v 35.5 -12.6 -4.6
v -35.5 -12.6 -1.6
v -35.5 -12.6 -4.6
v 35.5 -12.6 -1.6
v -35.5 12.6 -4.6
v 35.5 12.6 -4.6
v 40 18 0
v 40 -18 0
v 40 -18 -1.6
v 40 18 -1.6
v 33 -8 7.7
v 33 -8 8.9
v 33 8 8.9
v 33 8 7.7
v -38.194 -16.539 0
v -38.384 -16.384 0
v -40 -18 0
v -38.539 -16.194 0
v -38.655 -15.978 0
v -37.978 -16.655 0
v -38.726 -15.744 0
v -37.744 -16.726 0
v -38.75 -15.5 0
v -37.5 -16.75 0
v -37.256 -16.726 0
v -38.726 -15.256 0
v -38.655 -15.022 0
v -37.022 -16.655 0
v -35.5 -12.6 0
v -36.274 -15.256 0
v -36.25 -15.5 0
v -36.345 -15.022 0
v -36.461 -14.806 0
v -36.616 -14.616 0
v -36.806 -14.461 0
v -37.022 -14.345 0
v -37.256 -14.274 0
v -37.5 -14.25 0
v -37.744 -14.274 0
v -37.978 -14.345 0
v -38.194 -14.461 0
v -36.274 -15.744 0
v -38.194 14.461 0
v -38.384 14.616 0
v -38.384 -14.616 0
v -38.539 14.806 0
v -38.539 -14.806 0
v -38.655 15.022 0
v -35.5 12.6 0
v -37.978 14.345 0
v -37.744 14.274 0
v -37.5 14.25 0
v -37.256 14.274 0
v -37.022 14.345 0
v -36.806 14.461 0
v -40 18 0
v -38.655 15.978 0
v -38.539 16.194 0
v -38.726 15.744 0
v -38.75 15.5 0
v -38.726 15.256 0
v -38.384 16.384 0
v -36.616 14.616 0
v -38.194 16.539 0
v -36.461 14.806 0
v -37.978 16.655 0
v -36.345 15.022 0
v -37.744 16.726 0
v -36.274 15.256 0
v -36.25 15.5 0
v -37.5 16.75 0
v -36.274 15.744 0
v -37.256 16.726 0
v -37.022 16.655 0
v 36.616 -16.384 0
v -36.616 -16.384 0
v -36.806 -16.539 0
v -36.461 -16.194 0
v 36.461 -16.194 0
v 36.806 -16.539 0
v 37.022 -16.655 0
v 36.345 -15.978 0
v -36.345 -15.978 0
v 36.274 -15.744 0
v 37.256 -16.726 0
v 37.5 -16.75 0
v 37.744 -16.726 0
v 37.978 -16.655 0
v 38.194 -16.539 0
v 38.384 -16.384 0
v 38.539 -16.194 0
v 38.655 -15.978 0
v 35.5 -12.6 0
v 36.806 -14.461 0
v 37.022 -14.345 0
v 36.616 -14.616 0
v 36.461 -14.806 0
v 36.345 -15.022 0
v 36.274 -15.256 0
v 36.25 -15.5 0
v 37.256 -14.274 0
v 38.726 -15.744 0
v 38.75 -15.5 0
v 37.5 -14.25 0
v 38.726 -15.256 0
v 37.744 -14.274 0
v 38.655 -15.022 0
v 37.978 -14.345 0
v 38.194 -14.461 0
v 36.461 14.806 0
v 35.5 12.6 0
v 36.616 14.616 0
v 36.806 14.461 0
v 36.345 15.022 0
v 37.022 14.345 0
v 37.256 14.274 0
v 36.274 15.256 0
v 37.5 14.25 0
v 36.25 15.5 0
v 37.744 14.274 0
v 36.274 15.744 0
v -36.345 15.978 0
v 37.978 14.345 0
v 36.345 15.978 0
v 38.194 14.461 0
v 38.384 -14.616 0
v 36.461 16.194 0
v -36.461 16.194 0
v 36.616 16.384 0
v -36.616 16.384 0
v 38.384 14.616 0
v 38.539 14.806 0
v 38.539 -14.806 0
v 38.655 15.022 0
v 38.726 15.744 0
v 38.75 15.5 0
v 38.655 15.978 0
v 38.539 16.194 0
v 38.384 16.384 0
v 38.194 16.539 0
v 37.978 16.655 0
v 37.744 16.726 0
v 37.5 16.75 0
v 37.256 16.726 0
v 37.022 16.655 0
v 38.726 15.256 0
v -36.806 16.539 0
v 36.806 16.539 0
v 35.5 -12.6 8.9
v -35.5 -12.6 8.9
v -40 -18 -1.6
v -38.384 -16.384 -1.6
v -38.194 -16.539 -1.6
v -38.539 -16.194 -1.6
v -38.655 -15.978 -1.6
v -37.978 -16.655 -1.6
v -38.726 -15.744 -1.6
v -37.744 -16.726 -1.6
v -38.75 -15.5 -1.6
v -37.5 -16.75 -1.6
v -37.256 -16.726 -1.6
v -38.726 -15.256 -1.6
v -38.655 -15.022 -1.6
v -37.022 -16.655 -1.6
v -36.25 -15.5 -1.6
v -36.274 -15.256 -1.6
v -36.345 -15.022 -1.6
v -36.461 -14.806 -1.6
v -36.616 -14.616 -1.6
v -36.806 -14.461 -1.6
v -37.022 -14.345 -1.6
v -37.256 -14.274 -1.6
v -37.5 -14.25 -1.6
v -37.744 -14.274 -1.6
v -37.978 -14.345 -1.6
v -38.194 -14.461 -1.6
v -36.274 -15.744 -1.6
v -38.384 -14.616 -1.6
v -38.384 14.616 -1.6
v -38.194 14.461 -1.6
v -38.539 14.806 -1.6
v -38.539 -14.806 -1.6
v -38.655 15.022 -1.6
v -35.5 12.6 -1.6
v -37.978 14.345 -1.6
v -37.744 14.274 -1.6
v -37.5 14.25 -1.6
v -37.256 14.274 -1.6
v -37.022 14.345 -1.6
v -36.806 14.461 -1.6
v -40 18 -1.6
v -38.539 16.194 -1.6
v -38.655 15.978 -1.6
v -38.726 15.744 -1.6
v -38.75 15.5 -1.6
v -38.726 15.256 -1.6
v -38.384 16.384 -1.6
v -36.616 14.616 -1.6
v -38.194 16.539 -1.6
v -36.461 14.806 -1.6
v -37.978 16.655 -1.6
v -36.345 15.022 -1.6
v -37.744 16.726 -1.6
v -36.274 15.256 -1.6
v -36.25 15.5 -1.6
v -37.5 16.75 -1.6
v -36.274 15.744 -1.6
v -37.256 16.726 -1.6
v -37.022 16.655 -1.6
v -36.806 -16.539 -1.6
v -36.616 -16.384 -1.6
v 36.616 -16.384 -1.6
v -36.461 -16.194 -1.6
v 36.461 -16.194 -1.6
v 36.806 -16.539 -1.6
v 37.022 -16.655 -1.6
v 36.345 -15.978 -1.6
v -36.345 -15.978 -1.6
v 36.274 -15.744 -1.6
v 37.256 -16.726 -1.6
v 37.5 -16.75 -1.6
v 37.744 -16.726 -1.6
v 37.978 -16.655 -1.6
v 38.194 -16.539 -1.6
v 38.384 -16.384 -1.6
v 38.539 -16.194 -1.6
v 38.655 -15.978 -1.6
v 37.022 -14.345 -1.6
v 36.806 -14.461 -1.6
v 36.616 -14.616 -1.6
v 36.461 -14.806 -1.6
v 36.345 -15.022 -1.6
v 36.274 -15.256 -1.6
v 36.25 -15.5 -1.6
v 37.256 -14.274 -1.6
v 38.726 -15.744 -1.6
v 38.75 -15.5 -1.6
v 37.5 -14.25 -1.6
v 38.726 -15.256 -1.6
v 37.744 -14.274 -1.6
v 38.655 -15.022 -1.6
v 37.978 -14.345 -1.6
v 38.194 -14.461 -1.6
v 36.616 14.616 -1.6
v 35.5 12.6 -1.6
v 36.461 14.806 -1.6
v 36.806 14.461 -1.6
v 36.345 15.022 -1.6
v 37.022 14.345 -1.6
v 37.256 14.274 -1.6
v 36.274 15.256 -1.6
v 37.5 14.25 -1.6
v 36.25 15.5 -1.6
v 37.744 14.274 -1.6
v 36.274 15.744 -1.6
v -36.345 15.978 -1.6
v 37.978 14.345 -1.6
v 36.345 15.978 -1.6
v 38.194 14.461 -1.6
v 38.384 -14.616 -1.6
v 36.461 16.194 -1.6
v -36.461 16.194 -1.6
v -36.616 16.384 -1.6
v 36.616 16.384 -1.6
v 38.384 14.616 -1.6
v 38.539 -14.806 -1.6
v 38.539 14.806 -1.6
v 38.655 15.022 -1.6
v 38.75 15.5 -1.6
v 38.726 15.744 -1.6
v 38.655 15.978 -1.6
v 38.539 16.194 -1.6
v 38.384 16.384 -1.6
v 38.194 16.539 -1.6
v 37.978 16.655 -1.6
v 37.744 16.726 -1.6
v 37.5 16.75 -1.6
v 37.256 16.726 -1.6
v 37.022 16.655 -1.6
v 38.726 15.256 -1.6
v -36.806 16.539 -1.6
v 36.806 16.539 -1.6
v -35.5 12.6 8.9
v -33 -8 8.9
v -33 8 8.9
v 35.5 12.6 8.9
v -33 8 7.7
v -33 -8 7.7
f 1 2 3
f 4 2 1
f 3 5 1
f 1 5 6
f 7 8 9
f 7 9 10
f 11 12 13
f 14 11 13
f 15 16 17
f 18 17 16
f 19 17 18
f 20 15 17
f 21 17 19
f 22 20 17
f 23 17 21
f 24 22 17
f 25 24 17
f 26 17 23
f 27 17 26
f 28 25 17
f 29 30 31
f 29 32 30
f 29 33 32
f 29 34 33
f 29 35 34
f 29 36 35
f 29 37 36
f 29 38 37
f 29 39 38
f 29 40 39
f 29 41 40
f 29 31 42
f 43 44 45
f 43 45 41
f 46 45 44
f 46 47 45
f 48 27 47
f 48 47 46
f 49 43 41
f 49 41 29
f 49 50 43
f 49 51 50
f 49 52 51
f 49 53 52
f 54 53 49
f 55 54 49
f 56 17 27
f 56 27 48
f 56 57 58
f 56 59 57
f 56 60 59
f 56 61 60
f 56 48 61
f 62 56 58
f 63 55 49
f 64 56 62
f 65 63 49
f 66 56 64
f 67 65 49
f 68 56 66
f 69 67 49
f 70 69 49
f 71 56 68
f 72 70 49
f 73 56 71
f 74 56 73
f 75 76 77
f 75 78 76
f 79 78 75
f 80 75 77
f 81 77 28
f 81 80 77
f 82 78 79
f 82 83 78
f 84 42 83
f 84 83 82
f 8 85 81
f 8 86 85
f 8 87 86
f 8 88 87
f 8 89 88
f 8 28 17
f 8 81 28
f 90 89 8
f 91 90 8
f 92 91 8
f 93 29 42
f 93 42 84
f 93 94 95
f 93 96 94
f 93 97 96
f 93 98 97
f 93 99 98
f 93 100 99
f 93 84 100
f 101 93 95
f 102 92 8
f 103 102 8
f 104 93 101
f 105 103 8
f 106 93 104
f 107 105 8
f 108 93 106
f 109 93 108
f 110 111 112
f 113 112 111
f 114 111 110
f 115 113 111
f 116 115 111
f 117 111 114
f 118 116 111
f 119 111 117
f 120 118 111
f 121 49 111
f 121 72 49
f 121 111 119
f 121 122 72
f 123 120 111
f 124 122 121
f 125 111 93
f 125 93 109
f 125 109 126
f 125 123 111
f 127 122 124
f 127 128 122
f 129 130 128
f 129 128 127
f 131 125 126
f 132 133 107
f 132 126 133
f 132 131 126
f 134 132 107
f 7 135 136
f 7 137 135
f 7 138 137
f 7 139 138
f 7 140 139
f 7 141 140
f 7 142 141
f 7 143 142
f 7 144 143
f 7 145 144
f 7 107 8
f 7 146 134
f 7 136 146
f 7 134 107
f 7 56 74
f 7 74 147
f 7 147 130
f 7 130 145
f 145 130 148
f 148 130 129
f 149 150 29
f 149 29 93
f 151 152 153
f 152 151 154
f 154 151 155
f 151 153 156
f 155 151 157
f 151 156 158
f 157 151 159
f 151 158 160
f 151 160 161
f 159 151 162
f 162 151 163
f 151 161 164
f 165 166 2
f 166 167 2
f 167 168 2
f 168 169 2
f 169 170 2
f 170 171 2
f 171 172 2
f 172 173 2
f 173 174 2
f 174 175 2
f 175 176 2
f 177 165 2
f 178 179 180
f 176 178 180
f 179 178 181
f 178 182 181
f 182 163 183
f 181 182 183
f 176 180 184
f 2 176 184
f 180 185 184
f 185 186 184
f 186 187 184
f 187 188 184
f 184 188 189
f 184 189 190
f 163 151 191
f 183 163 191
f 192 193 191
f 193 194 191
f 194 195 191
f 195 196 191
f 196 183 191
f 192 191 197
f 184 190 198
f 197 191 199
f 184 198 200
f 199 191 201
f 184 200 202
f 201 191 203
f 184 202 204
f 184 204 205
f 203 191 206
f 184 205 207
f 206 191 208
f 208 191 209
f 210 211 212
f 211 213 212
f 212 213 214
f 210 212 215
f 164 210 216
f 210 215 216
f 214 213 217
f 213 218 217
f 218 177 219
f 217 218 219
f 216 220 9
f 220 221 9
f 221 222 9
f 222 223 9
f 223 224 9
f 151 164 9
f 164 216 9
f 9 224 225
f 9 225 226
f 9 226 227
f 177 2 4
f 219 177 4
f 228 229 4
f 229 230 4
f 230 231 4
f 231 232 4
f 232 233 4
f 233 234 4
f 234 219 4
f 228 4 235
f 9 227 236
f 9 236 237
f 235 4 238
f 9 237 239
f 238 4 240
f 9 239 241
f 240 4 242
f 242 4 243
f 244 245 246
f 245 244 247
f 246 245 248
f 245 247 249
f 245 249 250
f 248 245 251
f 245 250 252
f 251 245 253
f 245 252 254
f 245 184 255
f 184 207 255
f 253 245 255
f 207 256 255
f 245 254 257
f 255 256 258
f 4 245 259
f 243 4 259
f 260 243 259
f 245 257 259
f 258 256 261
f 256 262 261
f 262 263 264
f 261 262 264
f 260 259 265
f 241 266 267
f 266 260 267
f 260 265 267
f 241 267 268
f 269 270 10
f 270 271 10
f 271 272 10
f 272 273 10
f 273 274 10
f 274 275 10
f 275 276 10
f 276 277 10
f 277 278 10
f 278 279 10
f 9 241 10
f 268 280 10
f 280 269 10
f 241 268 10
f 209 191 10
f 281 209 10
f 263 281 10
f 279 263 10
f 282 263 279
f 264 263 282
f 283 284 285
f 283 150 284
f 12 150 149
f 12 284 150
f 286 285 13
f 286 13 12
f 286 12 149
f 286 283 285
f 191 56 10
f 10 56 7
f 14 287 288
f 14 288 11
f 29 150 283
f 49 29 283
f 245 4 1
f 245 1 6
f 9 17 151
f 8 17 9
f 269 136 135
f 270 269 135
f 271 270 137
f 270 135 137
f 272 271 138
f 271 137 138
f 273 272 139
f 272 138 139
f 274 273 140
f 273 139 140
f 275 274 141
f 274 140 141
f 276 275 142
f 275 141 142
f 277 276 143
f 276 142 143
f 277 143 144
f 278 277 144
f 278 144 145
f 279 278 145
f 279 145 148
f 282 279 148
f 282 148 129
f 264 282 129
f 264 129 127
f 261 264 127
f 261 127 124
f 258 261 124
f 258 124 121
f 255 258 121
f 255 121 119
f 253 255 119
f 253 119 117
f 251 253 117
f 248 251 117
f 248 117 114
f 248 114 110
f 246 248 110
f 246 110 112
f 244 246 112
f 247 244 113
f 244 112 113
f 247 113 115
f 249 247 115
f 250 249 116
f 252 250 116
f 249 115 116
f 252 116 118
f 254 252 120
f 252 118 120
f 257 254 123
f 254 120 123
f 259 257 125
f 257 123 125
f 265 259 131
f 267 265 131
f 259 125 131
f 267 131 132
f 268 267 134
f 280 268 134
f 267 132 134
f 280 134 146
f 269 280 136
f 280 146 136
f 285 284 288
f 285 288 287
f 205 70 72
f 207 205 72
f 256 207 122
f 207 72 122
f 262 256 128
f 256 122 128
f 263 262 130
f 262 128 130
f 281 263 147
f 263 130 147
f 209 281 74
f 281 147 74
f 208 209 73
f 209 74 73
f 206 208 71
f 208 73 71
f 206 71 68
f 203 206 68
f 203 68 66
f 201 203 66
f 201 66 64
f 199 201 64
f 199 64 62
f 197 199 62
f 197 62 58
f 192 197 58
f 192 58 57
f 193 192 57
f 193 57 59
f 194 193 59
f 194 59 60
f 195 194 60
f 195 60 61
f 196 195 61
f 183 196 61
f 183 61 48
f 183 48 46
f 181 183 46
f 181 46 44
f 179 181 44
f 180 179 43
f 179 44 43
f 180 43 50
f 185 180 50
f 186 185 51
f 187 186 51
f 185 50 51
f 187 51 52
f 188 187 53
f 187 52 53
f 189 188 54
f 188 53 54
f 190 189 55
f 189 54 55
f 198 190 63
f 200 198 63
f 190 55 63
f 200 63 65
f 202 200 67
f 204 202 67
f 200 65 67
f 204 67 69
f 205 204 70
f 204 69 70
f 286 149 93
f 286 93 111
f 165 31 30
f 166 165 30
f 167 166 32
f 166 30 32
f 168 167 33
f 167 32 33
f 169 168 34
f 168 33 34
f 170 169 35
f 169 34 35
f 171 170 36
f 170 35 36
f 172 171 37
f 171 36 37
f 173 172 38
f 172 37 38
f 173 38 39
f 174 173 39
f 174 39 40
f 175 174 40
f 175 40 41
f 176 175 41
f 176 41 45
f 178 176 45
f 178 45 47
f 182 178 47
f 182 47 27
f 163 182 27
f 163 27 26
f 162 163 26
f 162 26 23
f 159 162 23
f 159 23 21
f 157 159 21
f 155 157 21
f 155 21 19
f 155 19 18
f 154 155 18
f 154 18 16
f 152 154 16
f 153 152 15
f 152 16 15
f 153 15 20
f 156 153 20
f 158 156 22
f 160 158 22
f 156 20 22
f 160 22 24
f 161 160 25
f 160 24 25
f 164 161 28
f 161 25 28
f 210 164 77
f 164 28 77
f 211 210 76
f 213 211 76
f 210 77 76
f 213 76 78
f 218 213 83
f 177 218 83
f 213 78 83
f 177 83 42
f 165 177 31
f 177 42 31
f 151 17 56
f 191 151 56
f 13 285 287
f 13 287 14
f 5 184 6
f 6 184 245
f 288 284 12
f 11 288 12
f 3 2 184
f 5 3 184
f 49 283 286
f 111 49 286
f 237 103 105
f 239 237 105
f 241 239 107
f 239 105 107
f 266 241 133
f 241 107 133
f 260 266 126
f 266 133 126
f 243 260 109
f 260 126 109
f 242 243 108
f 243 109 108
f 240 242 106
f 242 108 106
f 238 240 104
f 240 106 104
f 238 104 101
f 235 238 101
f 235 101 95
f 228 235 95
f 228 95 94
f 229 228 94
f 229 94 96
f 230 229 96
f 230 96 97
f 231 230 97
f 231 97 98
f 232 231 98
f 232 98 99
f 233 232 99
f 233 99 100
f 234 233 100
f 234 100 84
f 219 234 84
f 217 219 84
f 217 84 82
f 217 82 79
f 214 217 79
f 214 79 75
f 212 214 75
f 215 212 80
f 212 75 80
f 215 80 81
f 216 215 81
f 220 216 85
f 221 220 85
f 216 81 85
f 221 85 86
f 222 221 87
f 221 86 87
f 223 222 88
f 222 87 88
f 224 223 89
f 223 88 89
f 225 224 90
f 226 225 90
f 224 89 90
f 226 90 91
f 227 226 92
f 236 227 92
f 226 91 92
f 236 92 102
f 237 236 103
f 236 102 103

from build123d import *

# Parameters (mm, degrees)
SKETCH2_W           = 80
SKETCH2_H           = 36
SKETCH2_W_2         = 71
SKETCH2_H_2         = 25.2
SKETCH2_W_3         = 66
SKETCH2_H_3         = 16
BOSS_EXTRUDE1_DEPTH = 1.6
BOSS_EXTRUDE2_START = 8.9
SKETCH2_3_W         = 71
SKETCH2_3_H         = 25.2
SKETCH2_3_W_2       = 66
SKETCH2_3_H_2       = 16
BOSS_EXTRUDE2_DEPTH = 13.5
CUT_EXTRUDE1_START  = 8.9
SKETCH2_4_W         = 66
SKETCH2_4_H         = 16
CUT_EXTRUDE1_DEPTH  = 1.2
SKETCH3_R           = 1.25
CUT_EXTRUDE2_DEPTH  = 45.757234052


with BuildPart() as part:
    # Sketch2 → Boss-Extrude1 (new body)
    # profile 1 of 3: a face of its own
    with BuildSketch(Plane.XY):
        Rectangle(SKETCH2_W, SKETCH2_H)
        Rectangle(SKETCH2_W_2, SKETCH2_H_2, mode=Mode.SUBTRACT)
    # profile 2 of 3: a face of its own
    with BuildSketch(Plane.XY):
        Rectangle(SKETCH2_W_2, SKETCH2_H_2)
        Rectangle(SKETCH2_W_3, SKETCH2_H_3, mode=Mode.SUBTRACT)
    # profile 3 of 3: a face of its own
    with BuildSketch(Plane.XY):
        Rectangle(SKETCH2_W_3, SKETCH2_H_3)
    extrude(amount=-BOSS_EXTRUDE1_DEPTH)

    # Sketch2<3> → Boss-Extrude2 (add)
    # profile 1 of 2: a face of its own
    with BuildSketch(Plane.XY.offset(BOSS_EXTRUDE2_START)):
        Rectangle(SKETCH2_3_W, SKETCH2_3_H)
        Rectangle(SKETCH2_3_W_2, SKETCH2_3_H_2, mode=Mode.SUBTRACT)
    # profile 2 of 2: a face of its own
    with BuildSketch(Plane.XY.offset(BOSS_EXTRUDE2_START)):
        Rectangle(SKETCH2_3_W_2, SKETCH2_3_H_2)
    extrude(amount=-BOSS_EXTRUDE2_DEPTH)

    # Sketch2<4> → Cut-Extrude1 (cut)
    with BuildSketch(Plane.XY.offset(CUT_EXTRUDE1_START)):
        Rectangle(SKETCH2_4_W, SKETCH2_4_H)
    extrude(amount=-CUT_EXTRUDE1_DEPTH, mode=Mode.SUBTRACT)

    # Sketch3 → Cut-Extrude2 (cut, through all)
    with BuildSketch(Plane.XY):
        with Locations((37.5, 15.5)):
            Circle(SKETCH3_R)
        with Locations((-37.5, 15.5)):
            Circle(SKETCH3_R)
        with Locations((37.5, -15.5)):
            Circle(SKETCH3_R)
        with Locations((-37.5, -15.5)):
            Circle(SKETCH3_R)
    extrude(amount=-CUT_EXTRUDE2_DEPTH, mode=Mode.SUBTRACT)


solid = part.part
